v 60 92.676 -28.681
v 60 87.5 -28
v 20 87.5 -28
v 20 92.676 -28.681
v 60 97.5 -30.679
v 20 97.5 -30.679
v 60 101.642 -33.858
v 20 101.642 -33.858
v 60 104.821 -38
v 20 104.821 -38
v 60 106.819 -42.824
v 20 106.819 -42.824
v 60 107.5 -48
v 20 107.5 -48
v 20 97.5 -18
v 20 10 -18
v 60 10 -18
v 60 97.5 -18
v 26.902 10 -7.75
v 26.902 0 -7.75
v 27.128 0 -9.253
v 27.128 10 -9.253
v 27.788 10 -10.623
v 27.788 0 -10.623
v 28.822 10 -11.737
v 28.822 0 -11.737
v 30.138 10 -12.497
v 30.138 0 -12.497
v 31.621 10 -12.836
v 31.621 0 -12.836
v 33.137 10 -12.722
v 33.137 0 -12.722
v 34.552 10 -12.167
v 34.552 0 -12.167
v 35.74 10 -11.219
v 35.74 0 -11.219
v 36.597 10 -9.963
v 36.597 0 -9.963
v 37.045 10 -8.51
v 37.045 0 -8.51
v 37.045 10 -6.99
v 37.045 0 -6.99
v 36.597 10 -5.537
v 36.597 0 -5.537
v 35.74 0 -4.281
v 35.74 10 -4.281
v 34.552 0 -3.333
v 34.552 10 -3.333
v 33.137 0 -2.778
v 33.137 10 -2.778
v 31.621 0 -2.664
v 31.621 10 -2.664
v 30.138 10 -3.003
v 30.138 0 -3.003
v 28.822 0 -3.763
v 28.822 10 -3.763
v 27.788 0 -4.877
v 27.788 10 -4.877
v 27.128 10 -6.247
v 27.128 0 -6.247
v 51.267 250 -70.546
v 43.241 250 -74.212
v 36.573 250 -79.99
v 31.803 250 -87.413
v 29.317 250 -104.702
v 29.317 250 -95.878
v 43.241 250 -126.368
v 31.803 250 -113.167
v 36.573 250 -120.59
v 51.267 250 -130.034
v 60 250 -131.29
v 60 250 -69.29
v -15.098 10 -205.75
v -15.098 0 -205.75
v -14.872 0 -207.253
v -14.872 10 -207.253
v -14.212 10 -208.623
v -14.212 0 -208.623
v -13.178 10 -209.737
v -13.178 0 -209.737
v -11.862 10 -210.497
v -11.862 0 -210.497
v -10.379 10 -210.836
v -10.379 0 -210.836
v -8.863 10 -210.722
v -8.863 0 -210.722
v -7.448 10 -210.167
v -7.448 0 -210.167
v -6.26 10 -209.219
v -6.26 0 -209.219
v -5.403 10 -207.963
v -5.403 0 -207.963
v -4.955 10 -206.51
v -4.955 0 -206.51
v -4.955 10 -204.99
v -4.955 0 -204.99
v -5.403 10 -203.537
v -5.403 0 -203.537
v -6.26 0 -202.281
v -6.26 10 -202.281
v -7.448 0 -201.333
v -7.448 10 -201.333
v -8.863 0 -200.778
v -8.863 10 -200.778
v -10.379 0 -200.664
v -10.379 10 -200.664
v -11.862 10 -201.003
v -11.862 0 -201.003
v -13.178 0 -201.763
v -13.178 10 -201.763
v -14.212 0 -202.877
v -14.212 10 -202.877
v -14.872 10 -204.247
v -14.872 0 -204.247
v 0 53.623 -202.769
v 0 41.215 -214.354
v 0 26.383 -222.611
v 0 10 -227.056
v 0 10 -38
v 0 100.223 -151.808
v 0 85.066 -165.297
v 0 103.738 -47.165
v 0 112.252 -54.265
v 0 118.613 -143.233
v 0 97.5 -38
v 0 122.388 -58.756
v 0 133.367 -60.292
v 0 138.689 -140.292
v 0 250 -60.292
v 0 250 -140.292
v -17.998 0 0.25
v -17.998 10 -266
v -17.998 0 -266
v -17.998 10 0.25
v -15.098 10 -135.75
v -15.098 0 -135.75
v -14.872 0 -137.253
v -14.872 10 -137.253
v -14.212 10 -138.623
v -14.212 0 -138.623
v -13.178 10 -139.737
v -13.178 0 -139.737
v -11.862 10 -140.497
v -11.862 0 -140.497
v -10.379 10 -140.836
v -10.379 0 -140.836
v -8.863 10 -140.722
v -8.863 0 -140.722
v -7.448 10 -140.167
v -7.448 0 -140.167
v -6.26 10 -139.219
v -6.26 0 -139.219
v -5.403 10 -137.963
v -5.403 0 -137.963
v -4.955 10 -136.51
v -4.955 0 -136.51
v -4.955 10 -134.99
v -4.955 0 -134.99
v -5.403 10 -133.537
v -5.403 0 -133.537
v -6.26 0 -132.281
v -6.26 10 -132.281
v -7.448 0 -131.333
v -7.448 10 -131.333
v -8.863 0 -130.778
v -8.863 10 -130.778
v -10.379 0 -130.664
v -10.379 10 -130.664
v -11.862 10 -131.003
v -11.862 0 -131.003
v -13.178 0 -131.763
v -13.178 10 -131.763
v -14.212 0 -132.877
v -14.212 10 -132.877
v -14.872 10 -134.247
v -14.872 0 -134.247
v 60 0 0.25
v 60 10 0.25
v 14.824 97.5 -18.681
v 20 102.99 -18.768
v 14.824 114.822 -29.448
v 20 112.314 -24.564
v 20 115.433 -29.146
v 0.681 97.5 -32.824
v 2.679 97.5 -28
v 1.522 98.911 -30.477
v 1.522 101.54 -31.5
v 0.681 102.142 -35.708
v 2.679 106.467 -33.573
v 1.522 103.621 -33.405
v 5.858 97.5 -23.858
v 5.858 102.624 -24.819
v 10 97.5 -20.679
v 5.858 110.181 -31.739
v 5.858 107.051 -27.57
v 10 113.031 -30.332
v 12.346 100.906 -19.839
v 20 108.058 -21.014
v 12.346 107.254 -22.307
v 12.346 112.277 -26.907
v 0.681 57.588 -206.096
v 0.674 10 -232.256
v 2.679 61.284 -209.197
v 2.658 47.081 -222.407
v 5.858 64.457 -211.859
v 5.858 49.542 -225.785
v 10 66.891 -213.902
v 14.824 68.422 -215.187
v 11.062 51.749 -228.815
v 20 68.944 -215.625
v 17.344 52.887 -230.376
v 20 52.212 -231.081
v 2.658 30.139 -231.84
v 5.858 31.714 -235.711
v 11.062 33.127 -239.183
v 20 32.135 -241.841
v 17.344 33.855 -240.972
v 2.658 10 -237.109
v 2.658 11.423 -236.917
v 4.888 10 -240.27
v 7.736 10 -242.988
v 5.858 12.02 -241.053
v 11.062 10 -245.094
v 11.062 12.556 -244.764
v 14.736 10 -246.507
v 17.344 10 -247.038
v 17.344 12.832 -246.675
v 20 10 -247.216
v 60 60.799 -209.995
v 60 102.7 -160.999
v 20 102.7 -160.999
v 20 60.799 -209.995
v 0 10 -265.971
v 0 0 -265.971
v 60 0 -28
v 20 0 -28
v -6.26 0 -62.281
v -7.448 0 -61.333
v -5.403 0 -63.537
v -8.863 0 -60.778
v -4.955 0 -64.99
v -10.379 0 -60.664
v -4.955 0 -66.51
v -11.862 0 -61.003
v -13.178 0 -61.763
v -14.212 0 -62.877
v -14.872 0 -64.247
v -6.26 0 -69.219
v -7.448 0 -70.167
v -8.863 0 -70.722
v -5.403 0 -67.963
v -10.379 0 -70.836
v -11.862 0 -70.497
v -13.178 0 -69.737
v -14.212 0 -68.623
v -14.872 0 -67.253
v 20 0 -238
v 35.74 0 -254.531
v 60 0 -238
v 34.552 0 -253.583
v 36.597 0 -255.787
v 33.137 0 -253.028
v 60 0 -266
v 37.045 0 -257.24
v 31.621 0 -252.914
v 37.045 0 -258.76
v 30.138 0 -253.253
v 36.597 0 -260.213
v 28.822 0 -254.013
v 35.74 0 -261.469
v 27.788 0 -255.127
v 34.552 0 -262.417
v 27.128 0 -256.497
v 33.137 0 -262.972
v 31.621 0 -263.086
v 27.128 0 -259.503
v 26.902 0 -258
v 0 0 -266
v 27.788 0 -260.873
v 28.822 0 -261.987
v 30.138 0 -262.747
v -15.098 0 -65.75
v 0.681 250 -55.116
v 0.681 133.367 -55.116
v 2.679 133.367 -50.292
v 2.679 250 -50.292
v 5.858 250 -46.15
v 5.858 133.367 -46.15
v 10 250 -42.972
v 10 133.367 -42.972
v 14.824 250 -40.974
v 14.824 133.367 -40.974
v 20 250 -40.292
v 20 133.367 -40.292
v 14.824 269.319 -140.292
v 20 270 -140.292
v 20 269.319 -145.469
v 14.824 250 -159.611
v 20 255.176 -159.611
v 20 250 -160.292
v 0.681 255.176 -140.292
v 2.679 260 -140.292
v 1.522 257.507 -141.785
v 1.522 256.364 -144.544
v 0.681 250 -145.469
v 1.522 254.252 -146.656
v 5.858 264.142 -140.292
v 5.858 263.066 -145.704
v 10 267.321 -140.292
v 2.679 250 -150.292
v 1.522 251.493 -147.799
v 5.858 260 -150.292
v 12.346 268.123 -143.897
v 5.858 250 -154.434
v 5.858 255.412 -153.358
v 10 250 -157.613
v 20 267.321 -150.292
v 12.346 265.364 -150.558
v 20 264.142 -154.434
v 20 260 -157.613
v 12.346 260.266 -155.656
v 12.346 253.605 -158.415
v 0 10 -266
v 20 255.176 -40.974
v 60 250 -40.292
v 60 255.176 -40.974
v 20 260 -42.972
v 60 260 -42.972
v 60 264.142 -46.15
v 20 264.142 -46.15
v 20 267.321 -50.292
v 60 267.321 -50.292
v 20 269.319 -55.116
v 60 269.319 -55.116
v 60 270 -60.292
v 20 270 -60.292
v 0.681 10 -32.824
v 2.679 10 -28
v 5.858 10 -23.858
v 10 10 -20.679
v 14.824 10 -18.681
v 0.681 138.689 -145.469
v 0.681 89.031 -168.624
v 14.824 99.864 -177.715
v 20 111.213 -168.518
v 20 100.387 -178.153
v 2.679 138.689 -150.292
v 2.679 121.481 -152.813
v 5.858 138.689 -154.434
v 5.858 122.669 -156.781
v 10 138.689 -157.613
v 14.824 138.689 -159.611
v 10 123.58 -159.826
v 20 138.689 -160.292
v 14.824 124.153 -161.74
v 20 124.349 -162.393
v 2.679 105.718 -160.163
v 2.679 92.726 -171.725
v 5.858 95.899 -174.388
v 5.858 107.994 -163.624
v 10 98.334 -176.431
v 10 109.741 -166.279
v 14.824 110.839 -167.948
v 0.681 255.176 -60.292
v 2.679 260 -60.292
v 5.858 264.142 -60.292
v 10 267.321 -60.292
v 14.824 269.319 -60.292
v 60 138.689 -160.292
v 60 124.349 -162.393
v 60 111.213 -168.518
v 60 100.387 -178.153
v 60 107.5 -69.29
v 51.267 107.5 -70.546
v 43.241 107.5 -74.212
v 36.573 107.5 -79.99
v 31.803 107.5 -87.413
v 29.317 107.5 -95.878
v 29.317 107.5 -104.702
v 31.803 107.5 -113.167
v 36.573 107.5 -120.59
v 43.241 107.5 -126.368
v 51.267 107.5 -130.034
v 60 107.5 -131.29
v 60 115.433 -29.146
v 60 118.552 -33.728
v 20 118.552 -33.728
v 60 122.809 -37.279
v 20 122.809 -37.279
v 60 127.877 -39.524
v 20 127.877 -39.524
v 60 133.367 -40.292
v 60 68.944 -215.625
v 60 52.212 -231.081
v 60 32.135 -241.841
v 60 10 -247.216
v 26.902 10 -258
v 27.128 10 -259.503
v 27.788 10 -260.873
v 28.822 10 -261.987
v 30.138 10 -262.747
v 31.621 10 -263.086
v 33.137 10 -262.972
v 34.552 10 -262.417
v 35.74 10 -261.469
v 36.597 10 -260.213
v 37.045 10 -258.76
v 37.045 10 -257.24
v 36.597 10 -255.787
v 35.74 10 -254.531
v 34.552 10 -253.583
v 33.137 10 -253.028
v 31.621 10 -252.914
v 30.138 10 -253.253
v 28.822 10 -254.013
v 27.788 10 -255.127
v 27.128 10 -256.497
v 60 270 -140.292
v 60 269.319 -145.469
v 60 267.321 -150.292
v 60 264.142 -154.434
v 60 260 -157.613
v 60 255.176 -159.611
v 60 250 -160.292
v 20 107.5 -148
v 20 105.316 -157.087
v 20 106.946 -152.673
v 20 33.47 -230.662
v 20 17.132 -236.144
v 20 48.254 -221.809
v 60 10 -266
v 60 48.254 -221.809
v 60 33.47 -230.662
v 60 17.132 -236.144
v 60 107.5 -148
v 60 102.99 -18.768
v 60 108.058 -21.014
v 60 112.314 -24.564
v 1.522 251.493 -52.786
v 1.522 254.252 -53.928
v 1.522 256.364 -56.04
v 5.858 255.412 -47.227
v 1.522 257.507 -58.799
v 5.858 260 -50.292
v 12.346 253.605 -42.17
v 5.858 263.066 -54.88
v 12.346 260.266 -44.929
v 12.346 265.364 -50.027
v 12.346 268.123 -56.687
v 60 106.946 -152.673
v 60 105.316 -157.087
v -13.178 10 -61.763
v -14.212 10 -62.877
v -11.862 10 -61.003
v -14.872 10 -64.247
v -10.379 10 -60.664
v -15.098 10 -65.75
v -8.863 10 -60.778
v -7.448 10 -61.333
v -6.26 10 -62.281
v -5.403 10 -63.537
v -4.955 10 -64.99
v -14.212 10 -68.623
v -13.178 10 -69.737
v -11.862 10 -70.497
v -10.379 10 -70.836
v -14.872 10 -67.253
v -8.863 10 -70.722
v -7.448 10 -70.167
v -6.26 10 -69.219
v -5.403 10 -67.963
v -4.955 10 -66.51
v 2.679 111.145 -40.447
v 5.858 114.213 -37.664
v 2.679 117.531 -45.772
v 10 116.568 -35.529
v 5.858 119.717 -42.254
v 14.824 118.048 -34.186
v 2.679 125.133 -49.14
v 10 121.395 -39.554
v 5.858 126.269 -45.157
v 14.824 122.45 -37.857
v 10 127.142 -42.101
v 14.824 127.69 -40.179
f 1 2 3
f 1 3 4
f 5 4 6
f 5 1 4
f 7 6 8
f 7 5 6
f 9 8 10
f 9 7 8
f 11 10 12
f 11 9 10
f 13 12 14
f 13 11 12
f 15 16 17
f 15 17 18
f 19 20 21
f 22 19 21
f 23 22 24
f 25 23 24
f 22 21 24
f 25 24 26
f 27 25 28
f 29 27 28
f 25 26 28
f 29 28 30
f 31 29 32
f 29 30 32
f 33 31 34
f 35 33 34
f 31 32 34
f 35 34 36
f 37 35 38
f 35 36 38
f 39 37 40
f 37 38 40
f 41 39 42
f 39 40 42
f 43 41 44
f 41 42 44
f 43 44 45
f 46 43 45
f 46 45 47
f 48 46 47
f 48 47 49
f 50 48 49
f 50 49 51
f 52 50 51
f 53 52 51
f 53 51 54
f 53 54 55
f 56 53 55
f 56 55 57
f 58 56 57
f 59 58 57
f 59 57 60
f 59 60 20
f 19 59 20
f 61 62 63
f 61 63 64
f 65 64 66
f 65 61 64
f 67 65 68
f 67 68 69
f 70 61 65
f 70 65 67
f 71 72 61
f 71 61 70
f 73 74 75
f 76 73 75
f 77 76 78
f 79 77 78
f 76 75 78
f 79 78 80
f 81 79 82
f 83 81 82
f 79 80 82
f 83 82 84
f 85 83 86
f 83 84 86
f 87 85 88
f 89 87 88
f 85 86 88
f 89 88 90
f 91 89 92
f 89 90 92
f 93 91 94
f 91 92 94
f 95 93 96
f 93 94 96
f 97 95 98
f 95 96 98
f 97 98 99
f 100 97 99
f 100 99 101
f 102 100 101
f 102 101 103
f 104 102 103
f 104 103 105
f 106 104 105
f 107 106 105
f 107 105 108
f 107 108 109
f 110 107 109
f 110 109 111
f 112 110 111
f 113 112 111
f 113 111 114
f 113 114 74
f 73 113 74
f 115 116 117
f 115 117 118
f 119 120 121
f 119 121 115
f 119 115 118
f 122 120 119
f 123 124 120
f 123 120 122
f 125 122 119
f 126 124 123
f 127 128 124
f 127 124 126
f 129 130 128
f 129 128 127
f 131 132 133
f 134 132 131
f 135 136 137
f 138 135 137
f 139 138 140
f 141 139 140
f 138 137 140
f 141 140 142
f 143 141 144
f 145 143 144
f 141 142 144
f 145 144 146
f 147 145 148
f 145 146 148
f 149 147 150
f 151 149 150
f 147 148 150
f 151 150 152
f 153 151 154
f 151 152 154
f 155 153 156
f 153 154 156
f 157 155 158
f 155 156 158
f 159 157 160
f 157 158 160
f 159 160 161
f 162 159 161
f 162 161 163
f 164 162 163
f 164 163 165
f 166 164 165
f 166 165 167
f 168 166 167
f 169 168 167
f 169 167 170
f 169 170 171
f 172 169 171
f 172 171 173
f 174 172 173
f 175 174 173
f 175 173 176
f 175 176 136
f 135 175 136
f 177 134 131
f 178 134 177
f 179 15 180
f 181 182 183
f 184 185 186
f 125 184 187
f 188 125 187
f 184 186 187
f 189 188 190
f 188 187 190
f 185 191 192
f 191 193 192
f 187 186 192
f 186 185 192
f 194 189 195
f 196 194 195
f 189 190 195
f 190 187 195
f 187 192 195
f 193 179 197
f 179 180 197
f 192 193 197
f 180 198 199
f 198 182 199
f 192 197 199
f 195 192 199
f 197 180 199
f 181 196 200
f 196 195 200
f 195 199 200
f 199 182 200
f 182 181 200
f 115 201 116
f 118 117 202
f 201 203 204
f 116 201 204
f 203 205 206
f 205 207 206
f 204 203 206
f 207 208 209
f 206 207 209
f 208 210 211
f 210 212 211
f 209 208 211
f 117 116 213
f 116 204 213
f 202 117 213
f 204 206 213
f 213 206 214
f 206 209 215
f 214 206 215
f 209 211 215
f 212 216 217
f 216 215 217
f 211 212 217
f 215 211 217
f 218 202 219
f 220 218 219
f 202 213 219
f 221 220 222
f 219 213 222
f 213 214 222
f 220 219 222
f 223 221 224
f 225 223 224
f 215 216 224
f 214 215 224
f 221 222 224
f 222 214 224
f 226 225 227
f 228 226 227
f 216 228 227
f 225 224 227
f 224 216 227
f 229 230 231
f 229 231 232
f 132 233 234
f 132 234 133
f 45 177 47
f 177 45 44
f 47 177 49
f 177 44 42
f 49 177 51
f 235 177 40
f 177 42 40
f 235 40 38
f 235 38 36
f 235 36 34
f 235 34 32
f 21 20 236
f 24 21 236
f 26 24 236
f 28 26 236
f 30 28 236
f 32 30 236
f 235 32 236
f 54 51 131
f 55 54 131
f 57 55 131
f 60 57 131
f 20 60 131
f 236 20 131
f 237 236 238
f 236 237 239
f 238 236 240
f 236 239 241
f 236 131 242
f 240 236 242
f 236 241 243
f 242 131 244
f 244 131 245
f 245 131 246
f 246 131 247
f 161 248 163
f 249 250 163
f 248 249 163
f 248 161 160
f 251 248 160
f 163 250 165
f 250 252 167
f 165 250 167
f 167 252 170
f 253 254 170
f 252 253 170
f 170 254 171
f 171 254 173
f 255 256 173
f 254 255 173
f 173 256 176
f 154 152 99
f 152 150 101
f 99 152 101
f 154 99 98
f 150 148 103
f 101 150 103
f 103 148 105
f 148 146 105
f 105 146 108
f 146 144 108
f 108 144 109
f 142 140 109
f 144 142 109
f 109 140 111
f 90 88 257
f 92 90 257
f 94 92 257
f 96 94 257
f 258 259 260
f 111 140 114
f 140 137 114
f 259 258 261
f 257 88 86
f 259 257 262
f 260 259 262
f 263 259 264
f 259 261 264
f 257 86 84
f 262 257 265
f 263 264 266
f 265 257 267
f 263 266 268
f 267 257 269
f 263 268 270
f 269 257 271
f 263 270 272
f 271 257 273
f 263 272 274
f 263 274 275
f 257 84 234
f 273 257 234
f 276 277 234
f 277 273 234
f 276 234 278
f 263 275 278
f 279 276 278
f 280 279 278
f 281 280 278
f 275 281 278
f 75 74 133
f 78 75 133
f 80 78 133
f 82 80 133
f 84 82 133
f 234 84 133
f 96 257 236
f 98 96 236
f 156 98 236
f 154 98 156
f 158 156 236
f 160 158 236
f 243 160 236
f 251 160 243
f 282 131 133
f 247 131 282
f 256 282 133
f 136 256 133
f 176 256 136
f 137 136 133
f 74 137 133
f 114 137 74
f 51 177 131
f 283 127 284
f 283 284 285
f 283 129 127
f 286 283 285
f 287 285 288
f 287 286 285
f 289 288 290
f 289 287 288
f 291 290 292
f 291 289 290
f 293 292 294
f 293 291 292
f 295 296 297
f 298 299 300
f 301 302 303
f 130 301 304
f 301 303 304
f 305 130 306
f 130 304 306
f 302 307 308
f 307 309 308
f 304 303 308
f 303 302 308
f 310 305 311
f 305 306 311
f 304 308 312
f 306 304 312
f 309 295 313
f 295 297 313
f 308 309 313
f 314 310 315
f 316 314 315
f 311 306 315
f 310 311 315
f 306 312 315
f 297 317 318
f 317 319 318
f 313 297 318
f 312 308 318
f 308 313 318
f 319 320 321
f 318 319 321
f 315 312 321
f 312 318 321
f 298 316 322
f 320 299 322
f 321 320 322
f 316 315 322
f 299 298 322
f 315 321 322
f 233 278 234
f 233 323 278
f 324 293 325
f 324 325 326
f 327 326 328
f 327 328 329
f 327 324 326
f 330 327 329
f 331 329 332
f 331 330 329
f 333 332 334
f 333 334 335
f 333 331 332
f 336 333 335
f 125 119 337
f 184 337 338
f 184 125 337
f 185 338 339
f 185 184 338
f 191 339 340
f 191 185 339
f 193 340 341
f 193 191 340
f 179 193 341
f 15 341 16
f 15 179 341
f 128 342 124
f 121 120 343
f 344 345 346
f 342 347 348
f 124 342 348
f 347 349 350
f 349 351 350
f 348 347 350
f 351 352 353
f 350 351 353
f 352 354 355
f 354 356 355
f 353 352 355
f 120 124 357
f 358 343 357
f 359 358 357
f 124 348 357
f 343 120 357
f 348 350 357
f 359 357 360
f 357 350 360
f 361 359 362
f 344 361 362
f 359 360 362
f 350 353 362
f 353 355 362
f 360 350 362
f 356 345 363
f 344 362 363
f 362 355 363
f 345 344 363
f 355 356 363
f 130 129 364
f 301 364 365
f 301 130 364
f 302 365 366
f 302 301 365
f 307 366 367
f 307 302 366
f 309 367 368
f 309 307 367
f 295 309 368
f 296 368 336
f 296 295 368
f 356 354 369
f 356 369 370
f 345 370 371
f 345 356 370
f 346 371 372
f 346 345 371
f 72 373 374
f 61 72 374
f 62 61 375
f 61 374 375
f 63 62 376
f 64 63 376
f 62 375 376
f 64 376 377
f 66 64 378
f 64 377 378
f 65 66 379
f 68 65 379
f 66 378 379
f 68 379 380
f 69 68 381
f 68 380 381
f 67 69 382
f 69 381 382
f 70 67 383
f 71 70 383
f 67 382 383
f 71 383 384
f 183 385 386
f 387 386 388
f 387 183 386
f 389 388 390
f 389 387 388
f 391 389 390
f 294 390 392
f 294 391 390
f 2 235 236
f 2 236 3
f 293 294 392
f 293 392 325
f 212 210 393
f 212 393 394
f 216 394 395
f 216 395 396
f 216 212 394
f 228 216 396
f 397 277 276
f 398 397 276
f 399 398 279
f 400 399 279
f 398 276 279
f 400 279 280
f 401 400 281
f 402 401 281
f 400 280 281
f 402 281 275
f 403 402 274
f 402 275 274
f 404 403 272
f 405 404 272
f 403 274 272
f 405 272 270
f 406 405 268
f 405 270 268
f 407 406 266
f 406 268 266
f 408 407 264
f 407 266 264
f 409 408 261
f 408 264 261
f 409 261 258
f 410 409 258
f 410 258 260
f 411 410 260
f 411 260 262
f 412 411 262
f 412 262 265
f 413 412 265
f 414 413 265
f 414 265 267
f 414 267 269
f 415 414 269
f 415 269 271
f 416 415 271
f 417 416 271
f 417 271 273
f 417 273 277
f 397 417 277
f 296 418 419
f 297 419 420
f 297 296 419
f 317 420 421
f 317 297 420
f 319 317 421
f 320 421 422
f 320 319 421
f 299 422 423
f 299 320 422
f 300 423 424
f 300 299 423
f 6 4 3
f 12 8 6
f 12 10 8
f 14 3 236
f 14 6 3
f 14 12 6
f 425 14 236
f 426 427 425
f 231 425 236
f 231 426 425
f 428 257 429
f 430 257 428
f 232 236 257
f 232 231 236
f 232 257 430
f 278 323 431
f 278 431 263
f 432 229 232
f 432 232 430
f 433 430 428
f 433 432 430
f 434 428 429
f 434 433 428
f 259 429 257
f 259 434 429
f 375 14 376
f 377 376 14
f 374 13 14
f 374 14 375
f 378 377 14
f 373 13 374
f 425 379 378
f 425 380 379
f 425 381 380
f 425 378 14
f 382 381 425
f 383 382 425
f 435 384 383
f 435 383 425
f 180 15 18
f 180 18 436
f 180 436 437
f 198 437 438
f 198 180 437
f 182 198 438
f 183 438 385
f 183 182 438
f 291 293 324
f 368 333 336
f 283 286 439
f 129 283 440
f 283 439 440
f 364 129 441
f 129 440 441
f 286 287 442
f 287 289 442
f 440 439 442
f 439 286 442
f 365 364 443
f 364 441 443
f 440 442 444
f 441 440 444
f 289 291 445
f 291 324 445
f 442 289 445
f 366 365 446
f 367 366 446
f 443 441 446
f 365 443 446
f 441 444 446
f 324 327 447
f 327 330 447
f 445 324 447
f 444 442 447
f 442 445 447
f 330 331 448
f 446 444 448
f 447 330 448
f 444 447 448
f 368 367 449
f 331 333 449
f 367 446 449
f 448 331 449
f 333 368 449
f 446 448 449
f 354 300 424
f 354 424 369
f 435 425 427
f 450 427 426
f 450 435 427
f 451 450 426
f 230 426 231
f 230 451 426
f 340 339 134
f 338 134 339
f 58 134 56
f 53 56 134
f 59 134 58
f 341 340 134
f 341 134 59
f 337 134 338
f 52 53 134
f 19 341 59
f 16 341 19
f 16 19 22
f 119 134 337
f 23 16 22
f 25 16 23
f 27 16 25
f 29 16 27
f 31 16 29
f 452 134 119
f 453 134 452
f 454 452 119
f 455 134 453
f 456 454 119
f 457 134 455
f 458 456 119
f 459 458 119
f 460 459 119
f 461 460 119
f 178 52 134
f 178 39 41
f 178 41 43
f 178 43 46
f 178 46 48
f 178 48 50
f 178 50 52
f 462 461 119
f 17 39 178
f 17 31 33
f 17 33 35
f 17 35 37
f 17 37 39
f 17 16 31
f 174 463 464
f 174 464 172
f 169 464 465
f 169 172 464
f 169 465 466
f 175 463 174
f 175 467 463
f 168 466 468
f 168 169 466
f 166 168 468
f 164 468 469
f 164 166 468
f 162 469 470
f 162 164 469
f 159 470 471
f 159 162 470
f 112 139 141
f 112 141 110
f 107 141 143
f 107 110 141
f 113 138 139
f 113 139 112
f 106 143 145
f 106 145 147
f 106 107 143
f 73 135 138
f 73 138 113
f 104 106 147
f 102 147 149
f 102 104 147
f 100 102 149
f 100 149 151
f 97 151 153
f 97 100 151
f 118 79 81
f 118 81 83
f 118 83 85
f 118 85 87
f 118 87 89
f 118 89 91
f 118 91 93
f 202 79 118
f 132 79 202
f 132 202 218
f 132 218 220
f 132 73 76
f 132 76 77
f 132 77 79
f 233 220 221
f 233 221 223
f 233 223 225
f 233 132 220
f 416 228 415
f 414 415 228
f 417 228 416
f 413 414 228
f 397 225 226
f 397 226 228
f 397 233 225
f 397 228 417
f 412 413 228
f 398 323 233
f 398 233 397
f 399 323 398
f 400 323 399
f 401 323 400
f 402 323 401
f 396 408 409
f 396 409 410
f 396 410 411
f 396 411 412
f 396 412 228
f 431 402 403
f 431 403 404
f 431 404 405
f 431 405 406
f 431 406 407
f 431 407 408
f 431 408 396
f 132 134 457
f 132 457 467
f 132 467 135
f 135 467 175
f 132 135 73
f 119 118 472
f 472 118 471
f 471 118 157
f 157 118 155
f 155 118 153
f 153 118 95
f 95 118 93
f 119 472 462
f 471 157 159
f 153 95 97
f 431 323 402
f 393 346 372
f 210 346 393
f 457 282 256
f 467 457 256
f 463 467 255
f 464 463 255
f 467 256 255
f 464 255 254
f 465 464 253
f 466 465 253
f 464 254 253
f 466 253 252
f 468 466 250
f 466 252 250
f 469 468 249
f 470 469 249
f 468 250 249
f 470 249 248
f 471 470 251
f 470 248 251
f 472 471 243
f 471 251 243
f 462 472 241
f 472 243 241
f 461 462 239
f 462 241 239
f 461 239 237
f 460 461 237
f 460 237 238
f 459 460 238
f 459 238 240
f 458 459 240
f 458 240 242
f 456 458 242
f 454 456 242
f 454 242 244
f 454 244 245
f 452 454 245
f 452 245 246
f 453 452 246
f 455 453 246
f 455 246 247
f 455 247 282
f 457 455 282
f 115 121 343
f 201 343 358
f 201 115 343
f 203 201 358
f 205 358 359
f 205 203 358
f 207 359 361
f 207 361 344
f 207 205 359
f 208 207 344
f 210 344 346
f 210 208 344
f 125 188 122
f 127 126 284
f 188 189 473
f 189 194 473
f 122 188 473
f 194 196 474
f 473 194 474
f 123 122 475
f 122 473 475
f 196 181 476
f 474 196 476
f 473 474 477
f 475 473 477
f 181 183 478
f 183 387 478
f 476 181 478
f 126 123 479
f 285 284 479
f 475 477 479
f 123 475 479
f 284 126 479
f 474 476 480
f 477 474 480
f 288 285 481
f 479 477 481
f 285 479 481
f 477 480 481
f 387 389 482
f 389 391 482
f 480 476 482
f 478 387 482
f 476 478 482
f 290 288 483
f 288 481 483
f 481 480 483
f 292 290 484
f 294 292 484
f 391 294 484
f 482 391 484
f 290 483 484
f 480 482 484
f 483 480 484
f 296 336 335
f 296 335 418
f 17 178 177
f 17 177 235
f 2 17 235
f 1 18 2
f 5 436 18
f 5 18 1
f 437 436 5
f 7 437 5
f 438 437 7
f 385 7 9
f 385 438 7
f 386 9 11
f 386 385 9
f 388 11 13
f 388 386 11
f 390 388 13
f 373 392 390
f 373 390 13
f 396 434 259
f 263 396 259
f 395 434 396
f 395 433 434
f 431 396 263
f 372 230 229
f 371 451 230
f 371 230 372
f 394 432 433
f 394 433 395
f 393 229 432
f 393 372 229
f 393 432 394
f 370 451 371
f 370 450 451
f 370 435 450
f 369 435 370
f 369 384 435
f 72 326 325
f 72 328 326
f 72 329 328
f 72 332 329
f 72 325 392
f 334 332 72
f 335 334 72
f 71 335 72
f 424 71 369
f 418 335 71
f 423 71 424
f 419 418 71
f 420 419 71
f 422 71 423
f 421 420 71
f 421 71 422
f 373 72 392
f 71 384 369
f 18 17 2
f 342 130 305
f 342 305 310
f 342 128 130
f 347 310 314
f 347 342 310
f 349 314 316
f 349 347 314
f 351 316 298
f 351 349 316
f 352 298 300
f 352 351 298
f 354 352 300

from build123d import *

# Parameters (mm, degrees)
BOSS_EXTRUDE1_DEPTH   = 120
FILLET1_R             = 20
FILLET2_R             = 20
SKETCH2_W             = 18
SKETCH2_H             = 103
BOSS_EXTRUDE2_DEPTH   = 10
F_1_0MM_DOWEL_HOLE1_D = 10.2
F_1_0MM_DOWEL_HOLE2_D = 10.2
SKETCH7_R             = 31
CUT_EXTRUDE1_DEPTH    = 250
CUT_EXTRUDE2_DEPTH    = 40
BOSS_EXTRUDE3_START   = -20
BOSS_EXTRUDE3_DEPTH   = 20
SKETCH12_W            = 357.858152506
SKETCH12_H            = 320.052587915
CUT_EXTRUDE3_DEPTH    = 78


with BuildPart() as part:
    # Sketch1 → Boss-Extrude1 (new body)
    with BuildSketch(Plane(origin=(0, 0, 0), x_dir=(0, 0, -1), z_dir=(1, 0, 0))):
        with BuildLine():
            Line((0, 0), (0, 10))
            Line((0, 10), (18, 10))
            Line((18, 10), (18, 97.5))
            ThreePointArc((18, 97.5), (21.013571696, 108.05752118), (29.146125346, 115.433457659))
            ThreePointArc((29.146125346, 115.433457659), (37.278678997, 122.809394139), (40.292250693, 133.366915319))
            Line((40.292250693, 133.366915319), (40.292250693, 250))
            ThreePointArc((40.292250693, 250), (46.150115069, 264.142135624), (60.292250693, 270))
            Line((60.292250693, 270), (140.292250693, 270))
            ThreePointArc((140.292250693, 270), (154.434386317, 264.142135624), (160.292250693, 250))
            Line((160.292250693, 250), (160.292250693, 138.688740716))
            ThreePointArc((160.292250693, 138.688740716), (164.976861341, 117.557827629), (178.152870209, 100.38651856))
            Line((178.152870209, 100.38651856), (215.624604805, 68.943999881))
            ThreePointArc((215.624604805, 68.943999881), (237.098685885, 42.515288741), (247.216439033, 10))
            Line((247.216439033, 10), (266, 10))
            Line((266, 10), (266, 0))
            Line((266, 0), (147.773719933, 0))
            ThreePointArc((147.773719933, 0), (128, 23), (108.226280067, 0))
            Line((108.226280067, 0), (0, 0))
        make_face()
    extrude(amount=BOSS_EXTRUDE1_DEPTH)

    # Fillet1
    fillet1_edges = [part.edges().sort_by_distance(p)[0] for p in [
        (120, 42.515288741, -237.098685885),
        (120, 84.66525922, -196.888737507),
        (120, 117.557827629, -164.976861341),
        (120, 194.344370358, -160.292250693),
        (120, 264.142135624, -154.434386317),
        (120, 270, -100.292250693),
        (120, 264.142135624, -46.150115069),
        (120, 191.683457659, -40.292250693),
        (120, 122.809394139, -37.278678997),
        (120, 108.05752118, -21.013571696),
        (120, 53.75, -18),
    ]]
    fillet(fillet1_edges, radius=FILLET1_R)

    # Fillet2
    fillet2_edges = [part.edges().sort_by_distance(p)[0] for p in [
        (0, 53.75, -18),
        (0, 108.05752118, -21.013571696),
        (0, 122.809394139, -37.278678997),
        (0, 191.683457659, -40.292250693),
        (0, 264.142135624, -46.150115069),
        (0, 270, -100.292250693),
        (0, 264.142135624, -154.434386317),
        (0, 194.344370358, -160.292250693),
        (0, 117.557827629, -164.976861341),
        (0, 84.66525922, -196.888737507),
        (0, 42.515288741, -237.098685885),
    ]]
    fillet(fillet2_edges, radius=FILLET2_R)

    # Sketch2 → Boss-Extrude2 (add)
    with BuildSketch(Plane(origin=(0, 10, 0), x_dir=(1, 0, 0), z_dir=(0, 1, 0))):
        Polygon((-17.998263805, -0.25), (138, -0.25), (138, 93.5), (120, 93.5), (120, 0), (0, 0), (0, 265.971156308), (-17.998263805, 266), align=None)
        with Locations((129, 214.5)):
            Rectangle(SKETCH2_W, SKETCH2_H)
    extrude(amount=-BOSS_EXTRUDE2_DEPTH)

    # Ø1.0mm Dowel Hole1 (through all)
    with Locations(Plane(origin=(0, 10, 0), x_dir=(1, 0, 0), z_dir=(0, 1, 0))):
        with Locations((32.001736195, 258), (82.001736195, 258)):
            Hole(F_1_0MM_DOWEL_HOLE1_D / 2)

    # Ø1.0mm Dowel Hole2 (through all)
    with Locations(Plane(origin=(0, 10, 0), x_dir=(1, 0, 0), z_dir=(0, 1, 0))):
        with Locations((-9.998263805, 205.75), (-9.998263805, 135.75), (-9.998263805, 65.75), (32.001736195, 7.75), (82.001736195, 7.75), (130, 65.75), (130, 205.75)):
            Hole(F_1_0MM_DOWEL_HOLE2_D / 2)

    # Sketch7 → Cut-Extrude1 (cut)
    with BuildSketch(Plane.XZ):
        with Locations(Location((60.001736195, -100.29, 0), (0, 0, 270))):
            Circle(SKETCH7_R)
    extrude(amount=-CUT_EXTRUDE1_DEPTH, mode=Mode.SUBTRACT)

    # Sketch9 → Cut-Extrude2 (cut, symmetric)
    with BuildSketch(Plane(origin=(60, 0, 0), x_dir=(0, 0, -1), z_dir=(1, 0, 0))):
        with BuildLine():
            Line((28, 0), (28, 87.5))
            ThreePointArc((28, 87.5), (33.857864376, 101.642135624), (48, 107.5))
            Line((48, 107.5), (148, 107.5))
            ThreePointArc((148, 107.5), (154.928315168, 106.261621703), (160.998642822, 102.699844894))
            Line((160.998642822, 102.699844894), (209.994571286, 60.799379576))
            ThreePointArc((209.994571286, 60.799379576), (230.662114279, 33.469645181), (238, 0))
            Line((238, 0), (158, 0))
            Line((158, 0), (147.773719933, 0))
            ThreePointArc((147.773719933, 0), (128, 23), (108.226280067, 0))
            Line((108.226280067, 0), (28, 0))
        make_face()
    extrude(amount=CUT_EXTRUDE2_DEPTH, both=True, mode=Mode.SUBTRACT)

    # Sketch10 → Boss-Extrude3 (add)
    with BuildSketch(Plane(origin=(20, 0, 0), x_dir=(0, 0, -1), z_dir=(1, 0, 0)).offset(BOSS_EXTRUDE3_START)):
        with BuildLine():
            ThreePointArc((148, 3), (128, 23), (108, 3))
            Line((108, 3), (148, 3))
        make_face()
        with BuildLine():
            ThreePointArc((108, 3), (108.056650248, 1.495739163), (108.226280067, 0))
            Line((108.226280067, 0), (147.773719933, 0))
            ThreePointArc((147.773719933, 0), (147.943349752, 1.495739163), (148, 3))
            Line((148, 3), (108, 3))
        make_face()
    extrude(amount=BOSS_EXTRUDE3_DEPTH)

    # Sketch12 → Cut-Extrude3 (cut)
    with BuildSketch(Plane(origin=(138, 0, 0), x_dir=(0, 0, -1), z_dir=(1, 0, 0))):
        with Locations((133.670062861, 122.61081936)):
            Rectangle(SKETCH12_W, SKETCH12_H)
    extrude(amount=-CUT_EXTRUDE3_DEPTH, mode=Mode.SUBTRACT)


solid = part.part
